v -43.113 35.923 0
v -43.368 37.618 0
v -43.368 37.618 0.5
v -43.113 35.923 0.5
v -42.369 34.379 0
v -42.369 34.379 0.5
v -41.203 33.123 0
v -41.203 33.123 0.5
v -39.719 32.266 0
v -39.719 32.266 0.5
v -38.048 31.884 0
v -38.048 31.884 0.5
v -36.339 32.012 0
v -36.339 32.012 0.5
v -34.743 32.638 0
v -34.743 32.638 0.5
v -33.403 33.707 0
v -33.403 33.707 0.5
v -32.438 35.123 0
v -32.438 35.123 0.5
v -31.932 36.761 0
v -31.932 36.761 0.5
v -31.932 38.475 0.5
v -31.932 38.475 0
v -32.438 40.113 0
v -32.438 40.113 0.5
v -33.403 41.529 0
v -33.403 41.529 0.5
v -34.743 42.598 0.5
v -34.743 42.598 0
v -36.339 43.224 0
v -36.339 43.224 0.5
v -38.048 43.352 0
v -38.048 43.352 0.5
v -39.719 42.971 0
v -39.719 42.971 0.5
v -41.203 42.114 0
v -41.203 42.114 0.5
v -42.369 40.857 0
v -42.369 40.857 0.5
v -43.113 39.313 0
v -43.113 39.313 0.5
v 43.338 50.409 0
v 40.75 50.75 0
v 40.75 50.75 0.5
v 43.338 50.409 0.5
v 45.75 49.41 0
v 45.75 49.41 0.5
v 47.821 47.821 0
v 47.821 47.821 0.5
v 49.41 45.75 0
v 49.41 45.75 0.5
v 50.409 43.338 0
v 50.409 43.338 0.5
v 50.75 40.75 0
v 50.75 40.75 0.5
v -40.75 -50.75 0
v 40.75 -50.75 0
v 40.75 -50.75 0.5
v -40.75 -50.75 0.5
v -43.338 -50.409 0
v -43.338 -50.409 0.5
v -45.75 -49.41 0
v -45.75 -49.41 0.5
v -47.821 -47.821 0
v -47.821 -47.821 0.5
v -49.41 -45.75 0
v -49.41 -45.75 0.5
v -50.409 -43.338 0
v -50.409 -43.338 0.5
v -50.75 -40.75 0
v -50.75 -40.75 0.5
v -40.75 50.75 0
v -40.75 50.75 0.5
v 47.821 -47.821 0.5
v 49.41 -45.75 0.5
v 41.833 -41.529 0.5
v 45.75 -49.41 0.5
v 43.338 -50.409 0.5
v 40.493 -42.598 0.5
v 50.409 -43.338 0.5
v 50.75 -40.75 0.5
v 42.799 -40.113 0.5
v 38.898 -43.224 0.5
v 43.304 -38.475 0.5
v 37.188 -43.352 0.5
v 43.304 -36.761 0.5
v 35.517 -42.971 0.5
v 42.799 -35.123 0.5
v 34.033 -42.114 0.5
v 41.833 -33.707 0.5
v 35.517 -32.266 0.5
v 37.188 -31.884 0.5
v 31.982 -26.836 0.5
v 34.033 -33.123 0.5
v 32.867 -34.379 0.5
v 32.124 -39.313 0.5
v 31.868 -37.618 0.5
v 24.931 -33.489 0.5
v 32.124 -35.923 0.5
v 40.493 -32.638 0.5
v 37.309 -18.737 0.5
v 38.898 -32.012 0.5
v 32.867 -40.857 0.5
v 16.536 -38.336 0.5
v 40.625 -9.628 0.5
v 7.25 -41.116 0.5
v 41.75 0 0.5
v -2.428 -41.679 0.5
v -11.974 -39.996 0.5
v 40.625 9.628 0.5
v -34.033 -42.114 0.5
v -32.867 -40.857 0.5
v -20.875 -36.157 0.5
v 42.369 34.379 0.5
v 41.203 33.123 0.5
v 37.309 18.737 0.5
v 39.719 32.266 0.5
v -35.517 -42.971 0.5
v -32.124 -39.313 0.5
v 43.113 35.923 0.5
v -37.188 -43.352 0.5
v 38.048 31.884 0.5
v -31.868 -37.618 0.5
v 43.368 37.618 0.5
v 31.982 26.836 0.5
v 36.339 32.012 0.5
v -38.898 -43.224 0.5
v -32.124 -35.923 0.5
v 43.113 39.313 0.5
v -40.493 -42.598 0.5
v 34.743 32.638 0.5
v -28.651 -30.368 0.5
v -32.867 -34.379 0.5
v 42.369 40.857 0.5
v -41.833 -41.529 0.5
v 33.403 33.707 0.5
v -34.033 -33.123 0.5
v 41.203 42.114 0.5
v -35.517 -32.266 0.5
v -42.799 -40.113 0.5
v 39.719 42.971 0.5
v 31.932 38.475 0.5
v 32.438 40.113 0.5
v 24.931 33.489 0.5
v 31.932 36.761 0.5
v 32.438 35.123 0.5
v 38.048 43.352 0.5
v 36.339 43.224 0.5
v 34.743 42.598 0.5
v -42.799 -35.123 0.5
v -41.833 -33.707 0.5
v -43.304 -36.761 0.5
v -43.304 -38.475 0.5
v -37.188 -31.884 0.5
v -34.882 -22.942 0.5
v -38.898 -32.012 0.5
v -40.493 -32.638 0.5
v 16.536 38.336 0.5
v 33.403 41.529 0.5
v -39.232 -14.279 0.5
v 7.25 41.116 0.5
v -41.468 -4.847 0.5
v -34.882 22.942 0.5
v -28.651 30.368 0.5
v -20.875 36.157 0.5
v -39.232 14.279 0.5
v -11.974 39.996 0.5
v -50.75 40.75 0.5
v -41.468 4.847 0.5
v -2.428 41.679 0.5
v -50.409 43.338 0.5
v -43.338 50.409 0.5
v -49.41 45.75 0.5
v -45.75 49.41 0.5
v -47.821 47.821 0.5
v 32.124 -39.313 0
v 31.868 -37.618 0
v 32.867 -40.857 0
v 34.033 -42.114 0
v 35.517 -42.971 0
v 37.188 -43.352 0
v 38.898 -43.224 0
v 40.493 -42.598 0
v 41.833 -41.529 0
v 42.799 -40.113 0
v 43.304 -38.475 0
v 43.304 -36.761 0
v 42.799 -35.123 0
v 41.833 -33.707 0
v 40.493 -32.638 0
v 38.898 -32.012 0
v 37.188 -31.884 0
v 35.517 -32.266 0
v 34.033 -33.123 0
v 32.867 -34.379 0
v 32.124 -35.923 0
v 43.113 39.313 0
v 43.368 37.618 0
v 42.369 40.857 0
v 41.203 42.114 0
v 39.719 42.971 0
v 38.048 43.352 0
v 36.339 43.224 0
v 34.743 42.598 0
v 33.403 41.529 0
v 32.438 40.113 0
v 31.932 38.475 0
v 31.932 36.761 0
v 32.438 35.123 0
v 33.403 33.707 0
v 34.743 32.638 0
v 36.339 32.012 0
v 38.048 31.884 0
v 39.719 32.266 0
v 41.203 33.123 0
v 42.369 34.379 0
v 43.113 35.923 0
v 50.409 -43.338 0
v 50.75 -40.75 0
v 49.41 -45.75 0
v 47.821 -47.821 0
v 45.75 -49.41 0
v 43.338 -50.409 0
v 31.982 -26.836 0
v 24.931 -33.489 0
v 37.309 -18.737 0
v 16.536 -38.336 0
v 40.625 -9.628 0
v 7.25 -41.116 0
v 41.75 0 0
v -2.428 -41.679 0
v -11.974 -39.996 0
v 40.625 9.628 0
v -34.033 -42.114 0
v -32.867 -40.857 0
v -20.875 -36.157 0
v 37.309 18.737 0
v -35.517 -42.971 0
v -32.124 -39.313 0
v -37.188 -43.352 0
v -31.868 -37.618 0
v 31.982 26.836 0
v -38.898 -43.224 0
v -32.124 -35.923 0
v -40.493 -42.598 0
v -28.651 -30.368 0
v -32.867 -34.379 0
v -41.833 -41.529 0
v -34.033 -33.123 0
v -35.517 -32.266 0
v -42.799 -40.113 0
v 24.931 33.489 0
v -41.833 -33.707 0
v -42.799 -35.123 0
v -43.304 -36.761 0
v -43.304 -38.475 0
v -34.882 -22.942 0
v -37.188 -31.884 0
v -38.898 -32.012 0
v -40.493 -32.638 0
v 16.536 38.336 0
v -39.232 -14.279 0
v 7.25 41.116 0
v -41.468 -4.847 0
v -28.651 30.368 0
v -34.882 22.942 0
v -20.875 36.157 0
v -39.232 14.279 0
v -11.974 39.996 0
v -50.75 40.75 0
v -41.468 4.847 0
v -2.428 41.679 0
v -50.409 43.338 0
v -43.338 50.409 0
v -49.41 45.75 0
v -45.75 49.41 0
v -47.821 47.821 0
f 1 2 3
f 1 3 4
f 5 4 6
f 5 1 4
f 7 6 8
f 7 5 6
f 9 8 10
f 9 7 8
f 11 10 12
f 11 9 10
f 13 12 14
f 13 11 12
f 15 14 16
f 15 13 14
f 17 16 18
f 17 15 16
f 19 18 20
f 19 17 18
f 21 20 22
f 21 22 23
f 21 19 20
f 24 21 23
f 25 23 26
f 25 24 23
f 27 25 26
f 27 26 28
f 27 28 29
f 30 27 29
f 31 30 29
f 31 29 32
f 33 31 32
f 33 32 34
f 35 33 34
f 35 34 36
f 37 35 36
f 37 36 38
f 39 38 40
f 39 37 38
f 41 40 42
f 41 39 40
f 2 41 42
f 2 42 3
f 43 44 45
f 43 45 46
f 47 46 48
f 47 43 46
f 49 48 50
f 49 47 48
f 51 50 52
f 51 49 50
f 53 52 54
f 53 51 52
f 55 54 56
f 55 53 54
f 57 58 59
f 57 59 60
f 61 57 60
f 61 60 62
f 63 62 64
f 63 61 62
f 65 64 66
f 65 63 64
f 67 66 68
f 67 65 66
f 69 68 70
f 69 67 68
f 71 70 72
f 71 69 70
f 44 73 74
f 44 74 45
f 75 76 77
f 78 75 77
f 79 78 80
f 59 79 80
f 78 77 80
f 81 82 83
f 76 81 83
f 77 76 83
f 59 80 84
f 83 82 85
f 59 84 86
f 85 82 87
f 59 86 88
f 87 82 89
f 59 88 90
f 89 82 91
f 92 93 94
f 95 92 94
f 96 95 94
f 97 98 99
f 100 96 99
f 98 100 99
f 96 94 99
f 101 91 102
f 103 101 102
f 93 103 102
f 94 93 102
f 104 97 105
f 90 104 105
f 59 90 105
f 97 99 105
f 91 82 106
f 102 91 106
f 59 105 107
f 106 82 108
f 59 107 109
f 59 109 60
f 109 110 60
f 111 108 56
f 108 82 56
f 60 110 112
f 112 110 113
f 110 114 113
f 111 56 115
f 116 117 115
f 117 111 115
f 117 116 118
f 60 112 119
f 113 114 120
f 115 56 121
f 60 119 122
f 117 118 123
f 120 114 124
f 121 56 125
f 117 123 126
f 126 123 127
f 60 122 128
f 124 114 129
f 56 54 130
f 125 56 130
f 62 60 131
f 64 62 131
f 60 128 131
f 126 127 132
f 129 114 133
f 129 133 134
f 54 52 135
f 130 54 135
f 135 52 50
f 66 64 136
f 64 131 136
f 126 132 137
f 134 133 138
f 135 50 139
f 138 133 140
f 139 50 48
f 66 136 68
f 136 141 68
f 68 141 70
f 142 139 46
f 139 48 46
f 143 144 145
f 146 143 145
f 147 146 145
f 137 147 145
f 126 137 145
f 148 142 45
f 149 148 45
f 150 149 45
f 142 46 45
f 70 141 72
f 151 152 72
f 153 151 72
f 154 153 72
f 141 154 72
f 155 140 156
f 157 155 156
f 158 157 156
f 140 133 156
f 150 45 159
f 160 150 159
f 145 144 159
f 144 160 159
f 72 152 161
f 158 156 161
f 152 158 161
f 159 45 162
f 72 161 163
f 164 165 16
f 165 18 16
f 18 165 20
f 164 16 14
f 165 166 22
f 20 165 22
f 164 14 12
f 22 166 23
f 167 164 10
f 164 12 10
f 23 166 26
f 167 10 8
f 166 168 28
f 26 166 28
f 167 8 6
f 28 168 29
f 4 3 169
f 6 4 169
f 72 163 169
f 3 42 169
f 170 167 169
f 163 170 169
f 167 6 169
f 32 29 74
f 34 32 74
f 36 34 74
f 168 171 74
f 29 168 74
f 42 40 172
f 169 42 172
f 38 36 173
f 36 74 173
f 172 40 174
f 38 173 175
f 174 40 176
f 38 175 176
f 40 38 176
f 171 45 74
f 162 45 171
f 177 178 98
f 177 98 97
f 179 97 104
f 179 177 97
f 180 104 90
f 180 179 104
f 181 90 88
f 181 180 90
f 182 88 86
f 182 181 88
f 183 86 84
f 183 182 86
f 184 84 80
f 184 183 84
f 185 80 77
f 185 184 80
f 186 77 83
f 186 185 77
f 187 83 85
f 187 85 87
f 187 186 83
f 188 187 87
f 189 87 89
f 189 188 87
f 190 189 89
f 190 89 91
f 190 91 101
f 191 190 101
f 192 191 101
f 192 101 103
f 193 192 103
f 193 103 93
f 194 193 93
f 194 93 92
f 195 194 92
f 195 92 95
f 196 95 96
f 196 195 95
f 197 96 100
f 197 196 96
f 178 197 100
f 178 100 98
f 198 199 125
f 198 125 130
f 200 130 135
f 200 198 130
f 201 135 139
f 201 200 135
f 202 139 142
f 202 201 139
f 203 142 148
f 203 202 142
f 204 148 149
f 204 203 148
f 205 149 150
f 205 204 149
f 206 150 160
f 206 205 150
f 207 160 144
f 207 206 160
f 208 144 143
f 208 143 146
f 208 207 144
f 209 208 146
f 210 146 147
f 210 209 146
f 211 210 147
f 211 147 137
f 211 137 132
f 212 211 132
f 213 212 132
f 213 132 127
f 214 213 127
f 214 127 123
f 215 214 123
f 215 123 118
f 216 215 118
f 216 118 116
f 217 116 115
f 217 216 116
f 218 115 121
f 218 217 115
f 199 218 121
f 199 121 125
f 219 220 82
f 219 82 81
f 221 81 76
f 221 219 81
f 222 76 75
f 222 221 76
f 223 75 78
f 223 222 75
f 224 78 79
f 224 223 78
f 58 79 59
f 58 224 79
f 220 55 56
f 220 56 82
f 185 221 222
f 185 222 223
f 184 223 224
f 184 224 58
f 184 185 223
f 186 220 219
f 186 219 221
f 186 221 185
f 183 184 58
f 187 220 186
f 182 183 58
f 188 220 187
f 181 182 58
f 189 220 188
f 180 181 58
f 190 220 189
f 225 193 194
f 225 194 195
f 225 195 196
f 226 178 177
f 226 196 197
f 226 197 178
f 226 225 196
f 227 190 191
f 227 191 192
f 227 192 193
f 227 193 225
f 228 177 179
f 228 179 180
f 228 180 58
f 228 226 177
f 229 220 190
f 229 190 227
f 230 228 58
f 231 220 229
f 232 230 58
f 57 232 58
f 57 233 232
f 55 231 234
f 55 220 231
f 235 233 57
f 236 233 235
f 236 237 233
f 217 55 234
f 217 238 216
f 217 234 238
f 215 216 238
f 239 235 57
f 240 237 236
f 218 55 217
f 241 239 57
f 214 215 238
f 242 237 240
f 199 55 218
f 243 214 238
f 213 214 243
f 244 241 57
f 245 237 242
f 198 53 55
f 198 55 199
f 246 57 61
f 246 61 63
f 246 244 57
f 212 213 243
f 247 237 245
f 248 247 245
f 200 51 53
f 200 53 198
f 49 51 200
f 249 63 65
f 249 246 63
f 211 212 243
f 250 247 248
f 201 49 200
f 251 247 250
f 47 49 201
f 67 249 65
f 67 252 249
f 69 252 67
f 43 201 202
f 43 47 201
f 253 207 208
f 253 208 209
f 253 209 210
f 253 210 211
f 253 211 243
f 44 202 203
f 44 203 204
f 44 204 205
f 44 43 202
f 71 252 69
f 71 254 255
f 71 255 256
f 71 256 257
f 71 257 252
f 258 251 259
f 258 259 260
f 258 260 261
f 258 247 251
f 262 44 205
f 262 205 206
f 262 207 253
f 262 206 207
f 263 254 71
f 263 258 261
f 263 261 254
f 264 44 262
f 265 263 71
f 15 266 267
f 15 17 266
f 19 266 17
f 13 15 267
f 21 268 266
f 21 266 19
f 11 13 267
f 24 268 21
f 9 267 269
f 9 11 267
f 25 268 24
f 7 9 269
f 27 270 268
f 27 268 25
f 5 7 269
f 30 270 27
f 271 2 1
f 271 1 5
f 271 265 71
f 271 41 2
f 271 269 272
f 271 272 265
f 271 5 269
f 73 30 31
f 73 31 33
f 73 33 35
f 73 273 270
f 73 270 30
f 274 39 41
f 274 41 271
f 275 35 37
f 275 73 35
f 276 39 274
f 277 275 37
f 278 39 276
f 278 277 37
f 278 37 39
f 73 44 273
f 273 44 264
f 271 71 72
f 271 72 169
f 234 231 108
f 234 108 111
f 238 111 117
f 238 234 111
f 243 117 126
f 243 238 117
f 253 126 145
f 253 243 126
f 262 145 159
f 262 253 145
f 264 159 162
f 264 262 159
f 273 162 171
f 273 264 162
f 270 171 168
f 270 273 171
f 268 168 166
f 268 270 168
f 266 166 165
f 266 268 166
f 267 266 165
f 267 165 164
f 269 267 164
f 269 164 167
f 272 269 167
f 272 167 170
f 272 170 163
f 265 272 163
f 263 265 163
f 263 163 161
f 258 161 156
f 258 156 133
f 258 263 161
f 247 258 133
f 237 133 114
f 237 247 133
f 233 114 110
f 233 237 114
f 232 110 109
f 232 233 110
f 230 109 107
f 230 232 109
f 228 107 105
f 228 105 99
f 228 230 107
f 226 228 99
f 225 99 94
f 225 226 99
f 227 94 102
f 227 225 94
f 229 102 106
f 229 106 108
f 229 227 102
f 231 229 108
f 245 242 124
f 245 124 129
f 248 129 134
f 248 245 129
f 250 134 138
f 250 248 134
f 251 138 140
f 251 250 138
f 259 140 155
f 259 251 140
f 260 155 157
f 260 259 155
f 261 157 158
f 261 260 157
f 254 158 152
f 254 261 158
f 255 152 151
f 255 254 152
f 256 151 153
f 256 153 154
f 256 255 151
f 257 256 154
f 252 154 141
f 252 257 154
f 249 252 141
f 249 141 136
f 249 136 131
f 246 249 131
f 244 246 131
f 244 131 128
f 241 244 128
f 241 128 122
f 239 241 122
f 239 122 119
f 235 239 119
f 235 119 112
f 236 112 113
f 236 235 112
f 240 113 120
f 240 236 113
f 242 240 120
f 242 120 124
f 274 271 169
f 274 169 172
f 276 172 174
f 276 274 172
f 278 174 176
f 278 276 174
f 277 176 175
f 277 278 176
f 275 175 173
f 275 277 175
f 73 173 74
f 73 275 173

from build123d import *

# Parameters (mm, degrees)
SKETCH1_R      = 5.75
SKETCH1_R_2    = 41.75
EXTRUDE1_DEPTH = 0.5


with BuildPart() as part:
    # Sketch1 → Extrude1 (new body)
    with BuildSketch(Plane.XY):
        with BuildLine():
            Line((-40.75, 50.75), (40.75, 50.75))
            ThreePointArc((40.75, 50.75), (47.821067812, 47.821067812), (50.75, 40.75))
            Line((50.75, 40.75), (50.75, -40.75))
            ThreePointArc((50.75, -40.75), (47.821067812, -47.821067812), (40.75, -50.75))
            Line((40.75, -50.75), (-40.75, -50.75))
            ThreePointArc((-40.75, -50.75), (-47.821067812, -47.821067812), (-50.75, -40.75))
            Line((-50.75, -40.75), (-50.75, 40.75))
            ThreePointArc((-50.75, 40.75), (-47.821067812, 47.821067812), (-40.75, 50.75))
        make_face()
        with Locations((37.618080759, 37.618080759)):
            Circle(SKETCH1_R, mode=Mode.SUBTRACT)
        with Locations(Location((-37.618080759, 37.618080759, 0), (0, 0, 180))):
            Circle(SKETCH1_R, mode=Mode.SUBTRACT)
        with Locations((-37.618080759, -37.618080759)):
            Circle(SKETCH1_R, mode=Mode.SUBTRACT)
        with Locations(Location((37.618080759, -37.618080759, 0), (0, 0, 180))):
            Circle(SKETCH1_R, mode=Mode.SUBTRACT)
        Circle(SKETCH1_R_2, mode=Mode.SUBTRACT)
    extrude(amount=EXTRUDE1_DEPTH)


solid = part.part
